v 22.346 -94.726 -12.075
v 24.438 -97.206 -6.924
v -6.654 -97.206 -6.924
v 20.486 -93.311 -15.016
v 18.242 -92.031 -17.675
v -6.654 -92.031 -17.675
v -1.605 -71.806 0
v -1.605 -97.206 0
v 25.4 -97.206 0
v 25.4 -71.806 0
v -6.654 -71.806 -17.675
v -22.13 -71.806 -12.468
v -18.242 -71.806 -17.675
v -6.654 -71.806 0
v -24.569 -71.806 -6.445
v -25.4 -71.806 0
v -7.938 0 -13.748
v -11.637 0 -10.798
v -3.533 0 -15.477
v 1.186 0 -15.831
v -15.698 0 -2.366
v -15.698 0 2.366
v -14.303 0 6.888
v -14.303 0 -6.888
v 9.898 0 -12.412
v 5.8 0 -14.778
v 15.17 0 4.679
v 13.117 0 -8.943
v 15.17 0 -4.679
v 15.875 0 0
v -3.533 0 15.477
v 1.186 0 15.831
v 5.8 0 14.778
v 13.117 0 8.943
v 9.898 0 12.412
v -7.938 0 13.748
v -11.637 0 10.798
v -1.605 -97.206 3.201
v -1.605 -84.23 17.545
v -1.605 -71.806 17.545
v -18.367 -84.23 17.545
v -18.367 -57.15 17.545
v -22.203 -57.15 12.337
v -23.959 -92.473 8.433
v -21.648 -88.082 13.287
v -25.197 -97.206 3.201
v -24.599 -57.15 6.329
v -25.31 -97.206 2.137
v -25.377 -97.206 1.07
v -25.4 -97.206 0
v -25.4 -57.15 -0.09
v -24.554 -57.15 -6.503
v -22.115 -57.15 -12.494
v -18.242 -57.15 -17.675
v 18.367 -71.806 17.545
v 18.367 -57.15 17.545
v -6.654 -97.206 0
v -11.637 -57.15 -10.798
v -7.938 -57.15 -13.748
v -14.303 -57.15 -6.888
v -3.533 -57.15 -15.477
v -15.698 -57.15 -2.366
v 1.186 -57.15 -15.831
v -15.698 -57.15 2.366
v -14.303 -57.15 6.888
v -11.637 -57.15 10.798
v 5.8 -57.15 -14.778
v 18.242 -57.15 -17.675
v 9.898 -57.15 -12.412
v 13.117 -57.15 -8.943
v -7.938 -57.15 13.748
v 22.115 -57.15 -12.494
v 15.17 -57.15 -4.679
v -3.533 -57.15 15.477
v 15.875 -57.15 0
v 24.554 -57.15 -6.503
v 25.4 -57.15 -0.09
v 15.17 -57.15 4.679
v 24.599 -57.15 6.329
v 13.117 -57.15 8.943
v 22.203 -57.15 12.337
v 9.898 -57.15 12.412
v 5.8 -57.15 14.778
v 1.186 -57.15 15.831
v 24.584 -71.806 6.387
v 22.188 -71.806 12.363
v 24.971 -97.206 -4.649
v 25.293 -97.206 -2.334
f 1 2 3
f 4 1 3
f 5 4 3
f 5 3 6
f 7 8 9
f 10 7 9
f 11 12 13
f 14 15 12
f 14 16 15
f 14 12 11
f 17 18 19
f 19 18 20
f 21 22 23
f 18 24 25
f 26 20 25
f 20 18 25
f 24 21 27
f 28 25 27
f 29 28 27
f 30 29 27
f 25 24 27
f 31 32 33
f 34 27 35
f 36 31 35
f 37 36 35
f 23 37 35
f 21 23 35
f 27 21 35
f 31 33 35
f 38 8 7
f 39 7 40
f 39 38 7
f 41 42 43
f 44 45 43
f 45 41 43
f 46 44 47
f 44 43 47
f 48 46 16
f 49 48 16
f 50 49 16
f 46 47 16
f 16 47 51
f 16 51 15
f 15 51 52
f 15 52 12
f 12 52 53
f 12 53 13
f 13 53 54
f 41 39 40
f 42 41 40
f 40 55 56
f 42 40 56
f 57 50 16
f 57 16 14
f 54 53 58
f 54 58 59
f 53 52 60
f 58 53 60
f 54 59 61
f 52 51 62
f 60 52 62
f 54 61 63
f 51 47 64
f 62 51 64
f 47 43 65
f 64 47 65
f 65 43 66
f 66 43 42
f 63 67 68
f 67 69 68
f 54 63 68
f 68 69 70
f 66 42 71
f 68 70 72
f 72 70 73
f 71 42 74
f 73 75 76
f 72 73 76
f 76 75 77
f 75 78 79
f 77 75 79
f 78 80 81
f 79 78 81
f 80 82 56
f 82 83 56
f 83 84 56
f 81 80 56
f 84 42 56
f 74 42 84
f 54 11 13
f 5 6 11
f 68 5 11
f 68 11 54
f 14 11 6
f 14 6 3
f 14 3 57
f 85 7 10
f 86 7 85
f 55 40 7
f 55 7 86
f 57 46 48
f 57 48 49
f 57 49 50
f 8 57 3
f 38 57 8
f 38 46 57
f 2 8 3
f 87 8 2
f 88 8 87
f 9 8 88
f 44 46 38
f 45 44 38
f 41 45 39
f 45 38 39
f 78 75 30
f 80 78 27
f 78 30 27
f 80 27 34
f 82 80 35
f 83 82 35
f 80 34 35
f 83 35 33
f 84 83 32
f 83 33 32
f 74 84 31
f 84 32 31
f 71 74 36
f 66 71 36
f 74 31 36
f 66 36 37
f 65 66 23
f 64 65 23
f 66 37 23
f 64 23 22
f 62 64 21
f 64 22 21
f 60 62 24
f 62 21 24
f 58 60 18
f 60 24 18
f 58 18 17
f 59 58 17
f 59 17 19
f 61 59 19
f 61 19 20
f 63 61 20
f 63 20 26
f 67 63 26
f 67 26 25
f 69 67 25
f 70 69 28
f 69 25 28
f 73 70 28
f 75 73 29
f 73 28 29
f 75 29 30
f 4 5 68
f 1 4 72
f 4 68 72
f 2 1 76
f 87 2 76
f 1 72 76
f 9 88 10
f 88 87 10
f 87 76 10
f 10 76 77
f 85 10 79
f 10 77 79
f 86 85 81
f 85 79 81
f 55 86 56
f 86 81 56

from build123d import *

# Parameters (mm, degrees)
F0_R      = 15.875
F1_DEPTH  = 57.15
F2_R      = 25.4
F3_DEPTH  = 40.0558
F4_W      = 27.00502
F4_H      = 32.818373
F5_DEPTH  = 25.4
F6_W      = 22.263035
F6_H      = 30.068964
F7_DEPTH  = 25.4
F8_W      = 53.508617
F8_H      = 14.514484
F9_DEPTH  = 38.1
F11_DEPTH = 25.4
F12_W     = 57.841301
F12_H     = 15.814288
F13_DEPTH = 38.1
F15_DEPTH = 50.8


with BuildPart() as f1:
    # F0 (on Front) → F1 (new body)
    with BuildSketch(Plane.XZ):
        Circle(F0_R)
    extrude(amount=F1_DEPTH)

    # F2 (on face) → F3 (join)
    with BuildSketch(Plane.XZ.offset(57.15)):
        Circle(F2_R)
    extrude(amount=F3_DEPTH)

    # F4 (on face) → F5 (cut)
    with BuildSketch(Plane.XZ.offset(97.2058)):
        with Locations((11.89749, 16.409187)):
            Rectangle(F4_W, F4_H)
    extrude(amount=-F5_DEPTH, mode=Mode.SUBTRACT)

    # F6 (on face) → F7 (cut)
    with BuildSketch(Plane.XZ.offset(97.2058)):
        with Locations((-17.785884, -15.034482)):
            Rectangle(F6_W, F6_H)
    extrude(amount=-F7_DEPTH, mode=Mode.SUBTRACT)

    # F8 (on Right) → F9 (cut, symmetric)
    with BuildSketch(Plane.YZ):
        with Locations((-82.644399, 24.802346)):
            Rectangle(F8_W, F8_H)
    extrude(amount=F9_DEPTH, both=True, mode=Mode.SUBTRACT)

    # F10 (on face) → F11 (cut)
    with BuildSketch(Plane.YZ.offset(-1.60502)):
        Polygon((-104.001366, 21.551706), (-100.101955, 0), (-80.604888, 21.551706), align=None)
    extrude(amount=-F11_DEPTH, mode=Mode.SUBTRACT)

    # F12 (on face) → F13 (cut, symmetric)
    with BuildSketch(Plane.YZ.offset(-1.60502)):
        with Locations((-83.315812, -25.581674)):
            Rectangle(F12_W, F12_H)
    extrude(amount=F13_DEPTH, both=True, mode=Mode.SUBTRACT)

    # F14 (on face) → F15 (cut)
    with BuildSketch(Plane(origin=(-6.654367, 0, 0), x_dir=(0, -1, 0), z_dir=(-1, 0, 0))):
        Polygon((101.621397, -22.054199), (100.538224, 0), (89.923158, -22.054199), align=None)
    extrude(amount=-F15_DEPTH, mode=Mode.SUBTRACT)


solid = f1.part
